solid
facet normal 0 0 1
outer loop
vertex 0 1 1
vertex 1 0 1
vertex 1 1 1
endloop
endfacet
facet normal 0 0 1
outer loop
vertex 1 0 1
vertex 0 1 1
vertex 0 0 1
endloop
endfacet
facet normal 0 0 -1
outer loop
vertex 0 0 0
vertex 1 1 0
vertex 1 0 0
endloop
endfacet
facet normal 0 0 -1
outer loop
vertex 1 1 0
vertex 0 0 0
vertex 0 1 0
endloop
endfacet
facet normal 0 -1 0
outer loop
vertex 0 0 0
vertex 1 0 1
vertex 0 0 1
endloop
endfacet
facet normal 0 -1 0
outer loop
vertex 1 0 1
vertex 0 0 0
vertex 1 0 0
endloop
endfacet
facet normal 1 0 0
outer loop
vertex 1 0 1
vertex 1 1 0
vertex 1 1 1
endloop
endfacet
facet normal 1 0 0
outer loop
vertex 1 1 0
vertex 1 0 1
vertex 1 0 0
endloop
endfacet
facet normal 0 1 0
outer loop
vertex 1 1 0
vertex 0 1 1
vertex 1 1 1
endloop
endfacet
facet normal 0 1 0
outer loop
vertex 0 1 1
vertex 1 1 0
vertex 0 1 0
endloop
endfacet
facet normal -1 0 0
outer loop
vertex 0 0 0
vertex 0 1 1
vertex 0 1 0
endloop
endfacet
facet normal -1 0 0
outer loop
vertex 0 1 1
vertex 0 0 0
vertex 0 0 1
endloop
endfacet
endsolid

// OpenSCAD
module child1() {
	echo("child1");
}
module child2() {
	echo("child2");
}
module child3() {
	echo("child3");
}
module child4() {
	echo("child4");
}
module child5() {
	echo("child5");
}

module test_children_empty() {
	echo("Children empty: begin");
	children();
	echo("Children empty: end");
}
test_children_empty() {
	child1();child2();child3();child4();child5();
}

module test_children_scalar() {
	echo("Children scalar: begin");
	children(0); // child1
	children(4); // child5
	children(2); // child3
	children(5); // out
	children(-1); // out
	echo("Children scalar: end");
}
test_children_scalar() {
	child1();child2();child3();child4();child5();
}

module test_children_vector() {
	echo("Children vector: begin");
	children([4]); // child5 last
	children([0,3,1]); // child1, child4, child2
	children([5,-1]); // out, out
	echo("Children vector: end");
}
test_children_vector() {
	child1();child2();child3();child4();child5();
}

module test_children_range() {
	echo("Children range: begin");
	children([0:4]); // all
	children([1:2]); // child2, child3
	children([0:2:4]); // child1, child3, child5
	children([0:-1:4]); // out, out
	echo("Children range: end");
}
test_children_range() {
	child1();child2();child3();child4();child5();
}

// to avoid no object error
cube(1.0);
